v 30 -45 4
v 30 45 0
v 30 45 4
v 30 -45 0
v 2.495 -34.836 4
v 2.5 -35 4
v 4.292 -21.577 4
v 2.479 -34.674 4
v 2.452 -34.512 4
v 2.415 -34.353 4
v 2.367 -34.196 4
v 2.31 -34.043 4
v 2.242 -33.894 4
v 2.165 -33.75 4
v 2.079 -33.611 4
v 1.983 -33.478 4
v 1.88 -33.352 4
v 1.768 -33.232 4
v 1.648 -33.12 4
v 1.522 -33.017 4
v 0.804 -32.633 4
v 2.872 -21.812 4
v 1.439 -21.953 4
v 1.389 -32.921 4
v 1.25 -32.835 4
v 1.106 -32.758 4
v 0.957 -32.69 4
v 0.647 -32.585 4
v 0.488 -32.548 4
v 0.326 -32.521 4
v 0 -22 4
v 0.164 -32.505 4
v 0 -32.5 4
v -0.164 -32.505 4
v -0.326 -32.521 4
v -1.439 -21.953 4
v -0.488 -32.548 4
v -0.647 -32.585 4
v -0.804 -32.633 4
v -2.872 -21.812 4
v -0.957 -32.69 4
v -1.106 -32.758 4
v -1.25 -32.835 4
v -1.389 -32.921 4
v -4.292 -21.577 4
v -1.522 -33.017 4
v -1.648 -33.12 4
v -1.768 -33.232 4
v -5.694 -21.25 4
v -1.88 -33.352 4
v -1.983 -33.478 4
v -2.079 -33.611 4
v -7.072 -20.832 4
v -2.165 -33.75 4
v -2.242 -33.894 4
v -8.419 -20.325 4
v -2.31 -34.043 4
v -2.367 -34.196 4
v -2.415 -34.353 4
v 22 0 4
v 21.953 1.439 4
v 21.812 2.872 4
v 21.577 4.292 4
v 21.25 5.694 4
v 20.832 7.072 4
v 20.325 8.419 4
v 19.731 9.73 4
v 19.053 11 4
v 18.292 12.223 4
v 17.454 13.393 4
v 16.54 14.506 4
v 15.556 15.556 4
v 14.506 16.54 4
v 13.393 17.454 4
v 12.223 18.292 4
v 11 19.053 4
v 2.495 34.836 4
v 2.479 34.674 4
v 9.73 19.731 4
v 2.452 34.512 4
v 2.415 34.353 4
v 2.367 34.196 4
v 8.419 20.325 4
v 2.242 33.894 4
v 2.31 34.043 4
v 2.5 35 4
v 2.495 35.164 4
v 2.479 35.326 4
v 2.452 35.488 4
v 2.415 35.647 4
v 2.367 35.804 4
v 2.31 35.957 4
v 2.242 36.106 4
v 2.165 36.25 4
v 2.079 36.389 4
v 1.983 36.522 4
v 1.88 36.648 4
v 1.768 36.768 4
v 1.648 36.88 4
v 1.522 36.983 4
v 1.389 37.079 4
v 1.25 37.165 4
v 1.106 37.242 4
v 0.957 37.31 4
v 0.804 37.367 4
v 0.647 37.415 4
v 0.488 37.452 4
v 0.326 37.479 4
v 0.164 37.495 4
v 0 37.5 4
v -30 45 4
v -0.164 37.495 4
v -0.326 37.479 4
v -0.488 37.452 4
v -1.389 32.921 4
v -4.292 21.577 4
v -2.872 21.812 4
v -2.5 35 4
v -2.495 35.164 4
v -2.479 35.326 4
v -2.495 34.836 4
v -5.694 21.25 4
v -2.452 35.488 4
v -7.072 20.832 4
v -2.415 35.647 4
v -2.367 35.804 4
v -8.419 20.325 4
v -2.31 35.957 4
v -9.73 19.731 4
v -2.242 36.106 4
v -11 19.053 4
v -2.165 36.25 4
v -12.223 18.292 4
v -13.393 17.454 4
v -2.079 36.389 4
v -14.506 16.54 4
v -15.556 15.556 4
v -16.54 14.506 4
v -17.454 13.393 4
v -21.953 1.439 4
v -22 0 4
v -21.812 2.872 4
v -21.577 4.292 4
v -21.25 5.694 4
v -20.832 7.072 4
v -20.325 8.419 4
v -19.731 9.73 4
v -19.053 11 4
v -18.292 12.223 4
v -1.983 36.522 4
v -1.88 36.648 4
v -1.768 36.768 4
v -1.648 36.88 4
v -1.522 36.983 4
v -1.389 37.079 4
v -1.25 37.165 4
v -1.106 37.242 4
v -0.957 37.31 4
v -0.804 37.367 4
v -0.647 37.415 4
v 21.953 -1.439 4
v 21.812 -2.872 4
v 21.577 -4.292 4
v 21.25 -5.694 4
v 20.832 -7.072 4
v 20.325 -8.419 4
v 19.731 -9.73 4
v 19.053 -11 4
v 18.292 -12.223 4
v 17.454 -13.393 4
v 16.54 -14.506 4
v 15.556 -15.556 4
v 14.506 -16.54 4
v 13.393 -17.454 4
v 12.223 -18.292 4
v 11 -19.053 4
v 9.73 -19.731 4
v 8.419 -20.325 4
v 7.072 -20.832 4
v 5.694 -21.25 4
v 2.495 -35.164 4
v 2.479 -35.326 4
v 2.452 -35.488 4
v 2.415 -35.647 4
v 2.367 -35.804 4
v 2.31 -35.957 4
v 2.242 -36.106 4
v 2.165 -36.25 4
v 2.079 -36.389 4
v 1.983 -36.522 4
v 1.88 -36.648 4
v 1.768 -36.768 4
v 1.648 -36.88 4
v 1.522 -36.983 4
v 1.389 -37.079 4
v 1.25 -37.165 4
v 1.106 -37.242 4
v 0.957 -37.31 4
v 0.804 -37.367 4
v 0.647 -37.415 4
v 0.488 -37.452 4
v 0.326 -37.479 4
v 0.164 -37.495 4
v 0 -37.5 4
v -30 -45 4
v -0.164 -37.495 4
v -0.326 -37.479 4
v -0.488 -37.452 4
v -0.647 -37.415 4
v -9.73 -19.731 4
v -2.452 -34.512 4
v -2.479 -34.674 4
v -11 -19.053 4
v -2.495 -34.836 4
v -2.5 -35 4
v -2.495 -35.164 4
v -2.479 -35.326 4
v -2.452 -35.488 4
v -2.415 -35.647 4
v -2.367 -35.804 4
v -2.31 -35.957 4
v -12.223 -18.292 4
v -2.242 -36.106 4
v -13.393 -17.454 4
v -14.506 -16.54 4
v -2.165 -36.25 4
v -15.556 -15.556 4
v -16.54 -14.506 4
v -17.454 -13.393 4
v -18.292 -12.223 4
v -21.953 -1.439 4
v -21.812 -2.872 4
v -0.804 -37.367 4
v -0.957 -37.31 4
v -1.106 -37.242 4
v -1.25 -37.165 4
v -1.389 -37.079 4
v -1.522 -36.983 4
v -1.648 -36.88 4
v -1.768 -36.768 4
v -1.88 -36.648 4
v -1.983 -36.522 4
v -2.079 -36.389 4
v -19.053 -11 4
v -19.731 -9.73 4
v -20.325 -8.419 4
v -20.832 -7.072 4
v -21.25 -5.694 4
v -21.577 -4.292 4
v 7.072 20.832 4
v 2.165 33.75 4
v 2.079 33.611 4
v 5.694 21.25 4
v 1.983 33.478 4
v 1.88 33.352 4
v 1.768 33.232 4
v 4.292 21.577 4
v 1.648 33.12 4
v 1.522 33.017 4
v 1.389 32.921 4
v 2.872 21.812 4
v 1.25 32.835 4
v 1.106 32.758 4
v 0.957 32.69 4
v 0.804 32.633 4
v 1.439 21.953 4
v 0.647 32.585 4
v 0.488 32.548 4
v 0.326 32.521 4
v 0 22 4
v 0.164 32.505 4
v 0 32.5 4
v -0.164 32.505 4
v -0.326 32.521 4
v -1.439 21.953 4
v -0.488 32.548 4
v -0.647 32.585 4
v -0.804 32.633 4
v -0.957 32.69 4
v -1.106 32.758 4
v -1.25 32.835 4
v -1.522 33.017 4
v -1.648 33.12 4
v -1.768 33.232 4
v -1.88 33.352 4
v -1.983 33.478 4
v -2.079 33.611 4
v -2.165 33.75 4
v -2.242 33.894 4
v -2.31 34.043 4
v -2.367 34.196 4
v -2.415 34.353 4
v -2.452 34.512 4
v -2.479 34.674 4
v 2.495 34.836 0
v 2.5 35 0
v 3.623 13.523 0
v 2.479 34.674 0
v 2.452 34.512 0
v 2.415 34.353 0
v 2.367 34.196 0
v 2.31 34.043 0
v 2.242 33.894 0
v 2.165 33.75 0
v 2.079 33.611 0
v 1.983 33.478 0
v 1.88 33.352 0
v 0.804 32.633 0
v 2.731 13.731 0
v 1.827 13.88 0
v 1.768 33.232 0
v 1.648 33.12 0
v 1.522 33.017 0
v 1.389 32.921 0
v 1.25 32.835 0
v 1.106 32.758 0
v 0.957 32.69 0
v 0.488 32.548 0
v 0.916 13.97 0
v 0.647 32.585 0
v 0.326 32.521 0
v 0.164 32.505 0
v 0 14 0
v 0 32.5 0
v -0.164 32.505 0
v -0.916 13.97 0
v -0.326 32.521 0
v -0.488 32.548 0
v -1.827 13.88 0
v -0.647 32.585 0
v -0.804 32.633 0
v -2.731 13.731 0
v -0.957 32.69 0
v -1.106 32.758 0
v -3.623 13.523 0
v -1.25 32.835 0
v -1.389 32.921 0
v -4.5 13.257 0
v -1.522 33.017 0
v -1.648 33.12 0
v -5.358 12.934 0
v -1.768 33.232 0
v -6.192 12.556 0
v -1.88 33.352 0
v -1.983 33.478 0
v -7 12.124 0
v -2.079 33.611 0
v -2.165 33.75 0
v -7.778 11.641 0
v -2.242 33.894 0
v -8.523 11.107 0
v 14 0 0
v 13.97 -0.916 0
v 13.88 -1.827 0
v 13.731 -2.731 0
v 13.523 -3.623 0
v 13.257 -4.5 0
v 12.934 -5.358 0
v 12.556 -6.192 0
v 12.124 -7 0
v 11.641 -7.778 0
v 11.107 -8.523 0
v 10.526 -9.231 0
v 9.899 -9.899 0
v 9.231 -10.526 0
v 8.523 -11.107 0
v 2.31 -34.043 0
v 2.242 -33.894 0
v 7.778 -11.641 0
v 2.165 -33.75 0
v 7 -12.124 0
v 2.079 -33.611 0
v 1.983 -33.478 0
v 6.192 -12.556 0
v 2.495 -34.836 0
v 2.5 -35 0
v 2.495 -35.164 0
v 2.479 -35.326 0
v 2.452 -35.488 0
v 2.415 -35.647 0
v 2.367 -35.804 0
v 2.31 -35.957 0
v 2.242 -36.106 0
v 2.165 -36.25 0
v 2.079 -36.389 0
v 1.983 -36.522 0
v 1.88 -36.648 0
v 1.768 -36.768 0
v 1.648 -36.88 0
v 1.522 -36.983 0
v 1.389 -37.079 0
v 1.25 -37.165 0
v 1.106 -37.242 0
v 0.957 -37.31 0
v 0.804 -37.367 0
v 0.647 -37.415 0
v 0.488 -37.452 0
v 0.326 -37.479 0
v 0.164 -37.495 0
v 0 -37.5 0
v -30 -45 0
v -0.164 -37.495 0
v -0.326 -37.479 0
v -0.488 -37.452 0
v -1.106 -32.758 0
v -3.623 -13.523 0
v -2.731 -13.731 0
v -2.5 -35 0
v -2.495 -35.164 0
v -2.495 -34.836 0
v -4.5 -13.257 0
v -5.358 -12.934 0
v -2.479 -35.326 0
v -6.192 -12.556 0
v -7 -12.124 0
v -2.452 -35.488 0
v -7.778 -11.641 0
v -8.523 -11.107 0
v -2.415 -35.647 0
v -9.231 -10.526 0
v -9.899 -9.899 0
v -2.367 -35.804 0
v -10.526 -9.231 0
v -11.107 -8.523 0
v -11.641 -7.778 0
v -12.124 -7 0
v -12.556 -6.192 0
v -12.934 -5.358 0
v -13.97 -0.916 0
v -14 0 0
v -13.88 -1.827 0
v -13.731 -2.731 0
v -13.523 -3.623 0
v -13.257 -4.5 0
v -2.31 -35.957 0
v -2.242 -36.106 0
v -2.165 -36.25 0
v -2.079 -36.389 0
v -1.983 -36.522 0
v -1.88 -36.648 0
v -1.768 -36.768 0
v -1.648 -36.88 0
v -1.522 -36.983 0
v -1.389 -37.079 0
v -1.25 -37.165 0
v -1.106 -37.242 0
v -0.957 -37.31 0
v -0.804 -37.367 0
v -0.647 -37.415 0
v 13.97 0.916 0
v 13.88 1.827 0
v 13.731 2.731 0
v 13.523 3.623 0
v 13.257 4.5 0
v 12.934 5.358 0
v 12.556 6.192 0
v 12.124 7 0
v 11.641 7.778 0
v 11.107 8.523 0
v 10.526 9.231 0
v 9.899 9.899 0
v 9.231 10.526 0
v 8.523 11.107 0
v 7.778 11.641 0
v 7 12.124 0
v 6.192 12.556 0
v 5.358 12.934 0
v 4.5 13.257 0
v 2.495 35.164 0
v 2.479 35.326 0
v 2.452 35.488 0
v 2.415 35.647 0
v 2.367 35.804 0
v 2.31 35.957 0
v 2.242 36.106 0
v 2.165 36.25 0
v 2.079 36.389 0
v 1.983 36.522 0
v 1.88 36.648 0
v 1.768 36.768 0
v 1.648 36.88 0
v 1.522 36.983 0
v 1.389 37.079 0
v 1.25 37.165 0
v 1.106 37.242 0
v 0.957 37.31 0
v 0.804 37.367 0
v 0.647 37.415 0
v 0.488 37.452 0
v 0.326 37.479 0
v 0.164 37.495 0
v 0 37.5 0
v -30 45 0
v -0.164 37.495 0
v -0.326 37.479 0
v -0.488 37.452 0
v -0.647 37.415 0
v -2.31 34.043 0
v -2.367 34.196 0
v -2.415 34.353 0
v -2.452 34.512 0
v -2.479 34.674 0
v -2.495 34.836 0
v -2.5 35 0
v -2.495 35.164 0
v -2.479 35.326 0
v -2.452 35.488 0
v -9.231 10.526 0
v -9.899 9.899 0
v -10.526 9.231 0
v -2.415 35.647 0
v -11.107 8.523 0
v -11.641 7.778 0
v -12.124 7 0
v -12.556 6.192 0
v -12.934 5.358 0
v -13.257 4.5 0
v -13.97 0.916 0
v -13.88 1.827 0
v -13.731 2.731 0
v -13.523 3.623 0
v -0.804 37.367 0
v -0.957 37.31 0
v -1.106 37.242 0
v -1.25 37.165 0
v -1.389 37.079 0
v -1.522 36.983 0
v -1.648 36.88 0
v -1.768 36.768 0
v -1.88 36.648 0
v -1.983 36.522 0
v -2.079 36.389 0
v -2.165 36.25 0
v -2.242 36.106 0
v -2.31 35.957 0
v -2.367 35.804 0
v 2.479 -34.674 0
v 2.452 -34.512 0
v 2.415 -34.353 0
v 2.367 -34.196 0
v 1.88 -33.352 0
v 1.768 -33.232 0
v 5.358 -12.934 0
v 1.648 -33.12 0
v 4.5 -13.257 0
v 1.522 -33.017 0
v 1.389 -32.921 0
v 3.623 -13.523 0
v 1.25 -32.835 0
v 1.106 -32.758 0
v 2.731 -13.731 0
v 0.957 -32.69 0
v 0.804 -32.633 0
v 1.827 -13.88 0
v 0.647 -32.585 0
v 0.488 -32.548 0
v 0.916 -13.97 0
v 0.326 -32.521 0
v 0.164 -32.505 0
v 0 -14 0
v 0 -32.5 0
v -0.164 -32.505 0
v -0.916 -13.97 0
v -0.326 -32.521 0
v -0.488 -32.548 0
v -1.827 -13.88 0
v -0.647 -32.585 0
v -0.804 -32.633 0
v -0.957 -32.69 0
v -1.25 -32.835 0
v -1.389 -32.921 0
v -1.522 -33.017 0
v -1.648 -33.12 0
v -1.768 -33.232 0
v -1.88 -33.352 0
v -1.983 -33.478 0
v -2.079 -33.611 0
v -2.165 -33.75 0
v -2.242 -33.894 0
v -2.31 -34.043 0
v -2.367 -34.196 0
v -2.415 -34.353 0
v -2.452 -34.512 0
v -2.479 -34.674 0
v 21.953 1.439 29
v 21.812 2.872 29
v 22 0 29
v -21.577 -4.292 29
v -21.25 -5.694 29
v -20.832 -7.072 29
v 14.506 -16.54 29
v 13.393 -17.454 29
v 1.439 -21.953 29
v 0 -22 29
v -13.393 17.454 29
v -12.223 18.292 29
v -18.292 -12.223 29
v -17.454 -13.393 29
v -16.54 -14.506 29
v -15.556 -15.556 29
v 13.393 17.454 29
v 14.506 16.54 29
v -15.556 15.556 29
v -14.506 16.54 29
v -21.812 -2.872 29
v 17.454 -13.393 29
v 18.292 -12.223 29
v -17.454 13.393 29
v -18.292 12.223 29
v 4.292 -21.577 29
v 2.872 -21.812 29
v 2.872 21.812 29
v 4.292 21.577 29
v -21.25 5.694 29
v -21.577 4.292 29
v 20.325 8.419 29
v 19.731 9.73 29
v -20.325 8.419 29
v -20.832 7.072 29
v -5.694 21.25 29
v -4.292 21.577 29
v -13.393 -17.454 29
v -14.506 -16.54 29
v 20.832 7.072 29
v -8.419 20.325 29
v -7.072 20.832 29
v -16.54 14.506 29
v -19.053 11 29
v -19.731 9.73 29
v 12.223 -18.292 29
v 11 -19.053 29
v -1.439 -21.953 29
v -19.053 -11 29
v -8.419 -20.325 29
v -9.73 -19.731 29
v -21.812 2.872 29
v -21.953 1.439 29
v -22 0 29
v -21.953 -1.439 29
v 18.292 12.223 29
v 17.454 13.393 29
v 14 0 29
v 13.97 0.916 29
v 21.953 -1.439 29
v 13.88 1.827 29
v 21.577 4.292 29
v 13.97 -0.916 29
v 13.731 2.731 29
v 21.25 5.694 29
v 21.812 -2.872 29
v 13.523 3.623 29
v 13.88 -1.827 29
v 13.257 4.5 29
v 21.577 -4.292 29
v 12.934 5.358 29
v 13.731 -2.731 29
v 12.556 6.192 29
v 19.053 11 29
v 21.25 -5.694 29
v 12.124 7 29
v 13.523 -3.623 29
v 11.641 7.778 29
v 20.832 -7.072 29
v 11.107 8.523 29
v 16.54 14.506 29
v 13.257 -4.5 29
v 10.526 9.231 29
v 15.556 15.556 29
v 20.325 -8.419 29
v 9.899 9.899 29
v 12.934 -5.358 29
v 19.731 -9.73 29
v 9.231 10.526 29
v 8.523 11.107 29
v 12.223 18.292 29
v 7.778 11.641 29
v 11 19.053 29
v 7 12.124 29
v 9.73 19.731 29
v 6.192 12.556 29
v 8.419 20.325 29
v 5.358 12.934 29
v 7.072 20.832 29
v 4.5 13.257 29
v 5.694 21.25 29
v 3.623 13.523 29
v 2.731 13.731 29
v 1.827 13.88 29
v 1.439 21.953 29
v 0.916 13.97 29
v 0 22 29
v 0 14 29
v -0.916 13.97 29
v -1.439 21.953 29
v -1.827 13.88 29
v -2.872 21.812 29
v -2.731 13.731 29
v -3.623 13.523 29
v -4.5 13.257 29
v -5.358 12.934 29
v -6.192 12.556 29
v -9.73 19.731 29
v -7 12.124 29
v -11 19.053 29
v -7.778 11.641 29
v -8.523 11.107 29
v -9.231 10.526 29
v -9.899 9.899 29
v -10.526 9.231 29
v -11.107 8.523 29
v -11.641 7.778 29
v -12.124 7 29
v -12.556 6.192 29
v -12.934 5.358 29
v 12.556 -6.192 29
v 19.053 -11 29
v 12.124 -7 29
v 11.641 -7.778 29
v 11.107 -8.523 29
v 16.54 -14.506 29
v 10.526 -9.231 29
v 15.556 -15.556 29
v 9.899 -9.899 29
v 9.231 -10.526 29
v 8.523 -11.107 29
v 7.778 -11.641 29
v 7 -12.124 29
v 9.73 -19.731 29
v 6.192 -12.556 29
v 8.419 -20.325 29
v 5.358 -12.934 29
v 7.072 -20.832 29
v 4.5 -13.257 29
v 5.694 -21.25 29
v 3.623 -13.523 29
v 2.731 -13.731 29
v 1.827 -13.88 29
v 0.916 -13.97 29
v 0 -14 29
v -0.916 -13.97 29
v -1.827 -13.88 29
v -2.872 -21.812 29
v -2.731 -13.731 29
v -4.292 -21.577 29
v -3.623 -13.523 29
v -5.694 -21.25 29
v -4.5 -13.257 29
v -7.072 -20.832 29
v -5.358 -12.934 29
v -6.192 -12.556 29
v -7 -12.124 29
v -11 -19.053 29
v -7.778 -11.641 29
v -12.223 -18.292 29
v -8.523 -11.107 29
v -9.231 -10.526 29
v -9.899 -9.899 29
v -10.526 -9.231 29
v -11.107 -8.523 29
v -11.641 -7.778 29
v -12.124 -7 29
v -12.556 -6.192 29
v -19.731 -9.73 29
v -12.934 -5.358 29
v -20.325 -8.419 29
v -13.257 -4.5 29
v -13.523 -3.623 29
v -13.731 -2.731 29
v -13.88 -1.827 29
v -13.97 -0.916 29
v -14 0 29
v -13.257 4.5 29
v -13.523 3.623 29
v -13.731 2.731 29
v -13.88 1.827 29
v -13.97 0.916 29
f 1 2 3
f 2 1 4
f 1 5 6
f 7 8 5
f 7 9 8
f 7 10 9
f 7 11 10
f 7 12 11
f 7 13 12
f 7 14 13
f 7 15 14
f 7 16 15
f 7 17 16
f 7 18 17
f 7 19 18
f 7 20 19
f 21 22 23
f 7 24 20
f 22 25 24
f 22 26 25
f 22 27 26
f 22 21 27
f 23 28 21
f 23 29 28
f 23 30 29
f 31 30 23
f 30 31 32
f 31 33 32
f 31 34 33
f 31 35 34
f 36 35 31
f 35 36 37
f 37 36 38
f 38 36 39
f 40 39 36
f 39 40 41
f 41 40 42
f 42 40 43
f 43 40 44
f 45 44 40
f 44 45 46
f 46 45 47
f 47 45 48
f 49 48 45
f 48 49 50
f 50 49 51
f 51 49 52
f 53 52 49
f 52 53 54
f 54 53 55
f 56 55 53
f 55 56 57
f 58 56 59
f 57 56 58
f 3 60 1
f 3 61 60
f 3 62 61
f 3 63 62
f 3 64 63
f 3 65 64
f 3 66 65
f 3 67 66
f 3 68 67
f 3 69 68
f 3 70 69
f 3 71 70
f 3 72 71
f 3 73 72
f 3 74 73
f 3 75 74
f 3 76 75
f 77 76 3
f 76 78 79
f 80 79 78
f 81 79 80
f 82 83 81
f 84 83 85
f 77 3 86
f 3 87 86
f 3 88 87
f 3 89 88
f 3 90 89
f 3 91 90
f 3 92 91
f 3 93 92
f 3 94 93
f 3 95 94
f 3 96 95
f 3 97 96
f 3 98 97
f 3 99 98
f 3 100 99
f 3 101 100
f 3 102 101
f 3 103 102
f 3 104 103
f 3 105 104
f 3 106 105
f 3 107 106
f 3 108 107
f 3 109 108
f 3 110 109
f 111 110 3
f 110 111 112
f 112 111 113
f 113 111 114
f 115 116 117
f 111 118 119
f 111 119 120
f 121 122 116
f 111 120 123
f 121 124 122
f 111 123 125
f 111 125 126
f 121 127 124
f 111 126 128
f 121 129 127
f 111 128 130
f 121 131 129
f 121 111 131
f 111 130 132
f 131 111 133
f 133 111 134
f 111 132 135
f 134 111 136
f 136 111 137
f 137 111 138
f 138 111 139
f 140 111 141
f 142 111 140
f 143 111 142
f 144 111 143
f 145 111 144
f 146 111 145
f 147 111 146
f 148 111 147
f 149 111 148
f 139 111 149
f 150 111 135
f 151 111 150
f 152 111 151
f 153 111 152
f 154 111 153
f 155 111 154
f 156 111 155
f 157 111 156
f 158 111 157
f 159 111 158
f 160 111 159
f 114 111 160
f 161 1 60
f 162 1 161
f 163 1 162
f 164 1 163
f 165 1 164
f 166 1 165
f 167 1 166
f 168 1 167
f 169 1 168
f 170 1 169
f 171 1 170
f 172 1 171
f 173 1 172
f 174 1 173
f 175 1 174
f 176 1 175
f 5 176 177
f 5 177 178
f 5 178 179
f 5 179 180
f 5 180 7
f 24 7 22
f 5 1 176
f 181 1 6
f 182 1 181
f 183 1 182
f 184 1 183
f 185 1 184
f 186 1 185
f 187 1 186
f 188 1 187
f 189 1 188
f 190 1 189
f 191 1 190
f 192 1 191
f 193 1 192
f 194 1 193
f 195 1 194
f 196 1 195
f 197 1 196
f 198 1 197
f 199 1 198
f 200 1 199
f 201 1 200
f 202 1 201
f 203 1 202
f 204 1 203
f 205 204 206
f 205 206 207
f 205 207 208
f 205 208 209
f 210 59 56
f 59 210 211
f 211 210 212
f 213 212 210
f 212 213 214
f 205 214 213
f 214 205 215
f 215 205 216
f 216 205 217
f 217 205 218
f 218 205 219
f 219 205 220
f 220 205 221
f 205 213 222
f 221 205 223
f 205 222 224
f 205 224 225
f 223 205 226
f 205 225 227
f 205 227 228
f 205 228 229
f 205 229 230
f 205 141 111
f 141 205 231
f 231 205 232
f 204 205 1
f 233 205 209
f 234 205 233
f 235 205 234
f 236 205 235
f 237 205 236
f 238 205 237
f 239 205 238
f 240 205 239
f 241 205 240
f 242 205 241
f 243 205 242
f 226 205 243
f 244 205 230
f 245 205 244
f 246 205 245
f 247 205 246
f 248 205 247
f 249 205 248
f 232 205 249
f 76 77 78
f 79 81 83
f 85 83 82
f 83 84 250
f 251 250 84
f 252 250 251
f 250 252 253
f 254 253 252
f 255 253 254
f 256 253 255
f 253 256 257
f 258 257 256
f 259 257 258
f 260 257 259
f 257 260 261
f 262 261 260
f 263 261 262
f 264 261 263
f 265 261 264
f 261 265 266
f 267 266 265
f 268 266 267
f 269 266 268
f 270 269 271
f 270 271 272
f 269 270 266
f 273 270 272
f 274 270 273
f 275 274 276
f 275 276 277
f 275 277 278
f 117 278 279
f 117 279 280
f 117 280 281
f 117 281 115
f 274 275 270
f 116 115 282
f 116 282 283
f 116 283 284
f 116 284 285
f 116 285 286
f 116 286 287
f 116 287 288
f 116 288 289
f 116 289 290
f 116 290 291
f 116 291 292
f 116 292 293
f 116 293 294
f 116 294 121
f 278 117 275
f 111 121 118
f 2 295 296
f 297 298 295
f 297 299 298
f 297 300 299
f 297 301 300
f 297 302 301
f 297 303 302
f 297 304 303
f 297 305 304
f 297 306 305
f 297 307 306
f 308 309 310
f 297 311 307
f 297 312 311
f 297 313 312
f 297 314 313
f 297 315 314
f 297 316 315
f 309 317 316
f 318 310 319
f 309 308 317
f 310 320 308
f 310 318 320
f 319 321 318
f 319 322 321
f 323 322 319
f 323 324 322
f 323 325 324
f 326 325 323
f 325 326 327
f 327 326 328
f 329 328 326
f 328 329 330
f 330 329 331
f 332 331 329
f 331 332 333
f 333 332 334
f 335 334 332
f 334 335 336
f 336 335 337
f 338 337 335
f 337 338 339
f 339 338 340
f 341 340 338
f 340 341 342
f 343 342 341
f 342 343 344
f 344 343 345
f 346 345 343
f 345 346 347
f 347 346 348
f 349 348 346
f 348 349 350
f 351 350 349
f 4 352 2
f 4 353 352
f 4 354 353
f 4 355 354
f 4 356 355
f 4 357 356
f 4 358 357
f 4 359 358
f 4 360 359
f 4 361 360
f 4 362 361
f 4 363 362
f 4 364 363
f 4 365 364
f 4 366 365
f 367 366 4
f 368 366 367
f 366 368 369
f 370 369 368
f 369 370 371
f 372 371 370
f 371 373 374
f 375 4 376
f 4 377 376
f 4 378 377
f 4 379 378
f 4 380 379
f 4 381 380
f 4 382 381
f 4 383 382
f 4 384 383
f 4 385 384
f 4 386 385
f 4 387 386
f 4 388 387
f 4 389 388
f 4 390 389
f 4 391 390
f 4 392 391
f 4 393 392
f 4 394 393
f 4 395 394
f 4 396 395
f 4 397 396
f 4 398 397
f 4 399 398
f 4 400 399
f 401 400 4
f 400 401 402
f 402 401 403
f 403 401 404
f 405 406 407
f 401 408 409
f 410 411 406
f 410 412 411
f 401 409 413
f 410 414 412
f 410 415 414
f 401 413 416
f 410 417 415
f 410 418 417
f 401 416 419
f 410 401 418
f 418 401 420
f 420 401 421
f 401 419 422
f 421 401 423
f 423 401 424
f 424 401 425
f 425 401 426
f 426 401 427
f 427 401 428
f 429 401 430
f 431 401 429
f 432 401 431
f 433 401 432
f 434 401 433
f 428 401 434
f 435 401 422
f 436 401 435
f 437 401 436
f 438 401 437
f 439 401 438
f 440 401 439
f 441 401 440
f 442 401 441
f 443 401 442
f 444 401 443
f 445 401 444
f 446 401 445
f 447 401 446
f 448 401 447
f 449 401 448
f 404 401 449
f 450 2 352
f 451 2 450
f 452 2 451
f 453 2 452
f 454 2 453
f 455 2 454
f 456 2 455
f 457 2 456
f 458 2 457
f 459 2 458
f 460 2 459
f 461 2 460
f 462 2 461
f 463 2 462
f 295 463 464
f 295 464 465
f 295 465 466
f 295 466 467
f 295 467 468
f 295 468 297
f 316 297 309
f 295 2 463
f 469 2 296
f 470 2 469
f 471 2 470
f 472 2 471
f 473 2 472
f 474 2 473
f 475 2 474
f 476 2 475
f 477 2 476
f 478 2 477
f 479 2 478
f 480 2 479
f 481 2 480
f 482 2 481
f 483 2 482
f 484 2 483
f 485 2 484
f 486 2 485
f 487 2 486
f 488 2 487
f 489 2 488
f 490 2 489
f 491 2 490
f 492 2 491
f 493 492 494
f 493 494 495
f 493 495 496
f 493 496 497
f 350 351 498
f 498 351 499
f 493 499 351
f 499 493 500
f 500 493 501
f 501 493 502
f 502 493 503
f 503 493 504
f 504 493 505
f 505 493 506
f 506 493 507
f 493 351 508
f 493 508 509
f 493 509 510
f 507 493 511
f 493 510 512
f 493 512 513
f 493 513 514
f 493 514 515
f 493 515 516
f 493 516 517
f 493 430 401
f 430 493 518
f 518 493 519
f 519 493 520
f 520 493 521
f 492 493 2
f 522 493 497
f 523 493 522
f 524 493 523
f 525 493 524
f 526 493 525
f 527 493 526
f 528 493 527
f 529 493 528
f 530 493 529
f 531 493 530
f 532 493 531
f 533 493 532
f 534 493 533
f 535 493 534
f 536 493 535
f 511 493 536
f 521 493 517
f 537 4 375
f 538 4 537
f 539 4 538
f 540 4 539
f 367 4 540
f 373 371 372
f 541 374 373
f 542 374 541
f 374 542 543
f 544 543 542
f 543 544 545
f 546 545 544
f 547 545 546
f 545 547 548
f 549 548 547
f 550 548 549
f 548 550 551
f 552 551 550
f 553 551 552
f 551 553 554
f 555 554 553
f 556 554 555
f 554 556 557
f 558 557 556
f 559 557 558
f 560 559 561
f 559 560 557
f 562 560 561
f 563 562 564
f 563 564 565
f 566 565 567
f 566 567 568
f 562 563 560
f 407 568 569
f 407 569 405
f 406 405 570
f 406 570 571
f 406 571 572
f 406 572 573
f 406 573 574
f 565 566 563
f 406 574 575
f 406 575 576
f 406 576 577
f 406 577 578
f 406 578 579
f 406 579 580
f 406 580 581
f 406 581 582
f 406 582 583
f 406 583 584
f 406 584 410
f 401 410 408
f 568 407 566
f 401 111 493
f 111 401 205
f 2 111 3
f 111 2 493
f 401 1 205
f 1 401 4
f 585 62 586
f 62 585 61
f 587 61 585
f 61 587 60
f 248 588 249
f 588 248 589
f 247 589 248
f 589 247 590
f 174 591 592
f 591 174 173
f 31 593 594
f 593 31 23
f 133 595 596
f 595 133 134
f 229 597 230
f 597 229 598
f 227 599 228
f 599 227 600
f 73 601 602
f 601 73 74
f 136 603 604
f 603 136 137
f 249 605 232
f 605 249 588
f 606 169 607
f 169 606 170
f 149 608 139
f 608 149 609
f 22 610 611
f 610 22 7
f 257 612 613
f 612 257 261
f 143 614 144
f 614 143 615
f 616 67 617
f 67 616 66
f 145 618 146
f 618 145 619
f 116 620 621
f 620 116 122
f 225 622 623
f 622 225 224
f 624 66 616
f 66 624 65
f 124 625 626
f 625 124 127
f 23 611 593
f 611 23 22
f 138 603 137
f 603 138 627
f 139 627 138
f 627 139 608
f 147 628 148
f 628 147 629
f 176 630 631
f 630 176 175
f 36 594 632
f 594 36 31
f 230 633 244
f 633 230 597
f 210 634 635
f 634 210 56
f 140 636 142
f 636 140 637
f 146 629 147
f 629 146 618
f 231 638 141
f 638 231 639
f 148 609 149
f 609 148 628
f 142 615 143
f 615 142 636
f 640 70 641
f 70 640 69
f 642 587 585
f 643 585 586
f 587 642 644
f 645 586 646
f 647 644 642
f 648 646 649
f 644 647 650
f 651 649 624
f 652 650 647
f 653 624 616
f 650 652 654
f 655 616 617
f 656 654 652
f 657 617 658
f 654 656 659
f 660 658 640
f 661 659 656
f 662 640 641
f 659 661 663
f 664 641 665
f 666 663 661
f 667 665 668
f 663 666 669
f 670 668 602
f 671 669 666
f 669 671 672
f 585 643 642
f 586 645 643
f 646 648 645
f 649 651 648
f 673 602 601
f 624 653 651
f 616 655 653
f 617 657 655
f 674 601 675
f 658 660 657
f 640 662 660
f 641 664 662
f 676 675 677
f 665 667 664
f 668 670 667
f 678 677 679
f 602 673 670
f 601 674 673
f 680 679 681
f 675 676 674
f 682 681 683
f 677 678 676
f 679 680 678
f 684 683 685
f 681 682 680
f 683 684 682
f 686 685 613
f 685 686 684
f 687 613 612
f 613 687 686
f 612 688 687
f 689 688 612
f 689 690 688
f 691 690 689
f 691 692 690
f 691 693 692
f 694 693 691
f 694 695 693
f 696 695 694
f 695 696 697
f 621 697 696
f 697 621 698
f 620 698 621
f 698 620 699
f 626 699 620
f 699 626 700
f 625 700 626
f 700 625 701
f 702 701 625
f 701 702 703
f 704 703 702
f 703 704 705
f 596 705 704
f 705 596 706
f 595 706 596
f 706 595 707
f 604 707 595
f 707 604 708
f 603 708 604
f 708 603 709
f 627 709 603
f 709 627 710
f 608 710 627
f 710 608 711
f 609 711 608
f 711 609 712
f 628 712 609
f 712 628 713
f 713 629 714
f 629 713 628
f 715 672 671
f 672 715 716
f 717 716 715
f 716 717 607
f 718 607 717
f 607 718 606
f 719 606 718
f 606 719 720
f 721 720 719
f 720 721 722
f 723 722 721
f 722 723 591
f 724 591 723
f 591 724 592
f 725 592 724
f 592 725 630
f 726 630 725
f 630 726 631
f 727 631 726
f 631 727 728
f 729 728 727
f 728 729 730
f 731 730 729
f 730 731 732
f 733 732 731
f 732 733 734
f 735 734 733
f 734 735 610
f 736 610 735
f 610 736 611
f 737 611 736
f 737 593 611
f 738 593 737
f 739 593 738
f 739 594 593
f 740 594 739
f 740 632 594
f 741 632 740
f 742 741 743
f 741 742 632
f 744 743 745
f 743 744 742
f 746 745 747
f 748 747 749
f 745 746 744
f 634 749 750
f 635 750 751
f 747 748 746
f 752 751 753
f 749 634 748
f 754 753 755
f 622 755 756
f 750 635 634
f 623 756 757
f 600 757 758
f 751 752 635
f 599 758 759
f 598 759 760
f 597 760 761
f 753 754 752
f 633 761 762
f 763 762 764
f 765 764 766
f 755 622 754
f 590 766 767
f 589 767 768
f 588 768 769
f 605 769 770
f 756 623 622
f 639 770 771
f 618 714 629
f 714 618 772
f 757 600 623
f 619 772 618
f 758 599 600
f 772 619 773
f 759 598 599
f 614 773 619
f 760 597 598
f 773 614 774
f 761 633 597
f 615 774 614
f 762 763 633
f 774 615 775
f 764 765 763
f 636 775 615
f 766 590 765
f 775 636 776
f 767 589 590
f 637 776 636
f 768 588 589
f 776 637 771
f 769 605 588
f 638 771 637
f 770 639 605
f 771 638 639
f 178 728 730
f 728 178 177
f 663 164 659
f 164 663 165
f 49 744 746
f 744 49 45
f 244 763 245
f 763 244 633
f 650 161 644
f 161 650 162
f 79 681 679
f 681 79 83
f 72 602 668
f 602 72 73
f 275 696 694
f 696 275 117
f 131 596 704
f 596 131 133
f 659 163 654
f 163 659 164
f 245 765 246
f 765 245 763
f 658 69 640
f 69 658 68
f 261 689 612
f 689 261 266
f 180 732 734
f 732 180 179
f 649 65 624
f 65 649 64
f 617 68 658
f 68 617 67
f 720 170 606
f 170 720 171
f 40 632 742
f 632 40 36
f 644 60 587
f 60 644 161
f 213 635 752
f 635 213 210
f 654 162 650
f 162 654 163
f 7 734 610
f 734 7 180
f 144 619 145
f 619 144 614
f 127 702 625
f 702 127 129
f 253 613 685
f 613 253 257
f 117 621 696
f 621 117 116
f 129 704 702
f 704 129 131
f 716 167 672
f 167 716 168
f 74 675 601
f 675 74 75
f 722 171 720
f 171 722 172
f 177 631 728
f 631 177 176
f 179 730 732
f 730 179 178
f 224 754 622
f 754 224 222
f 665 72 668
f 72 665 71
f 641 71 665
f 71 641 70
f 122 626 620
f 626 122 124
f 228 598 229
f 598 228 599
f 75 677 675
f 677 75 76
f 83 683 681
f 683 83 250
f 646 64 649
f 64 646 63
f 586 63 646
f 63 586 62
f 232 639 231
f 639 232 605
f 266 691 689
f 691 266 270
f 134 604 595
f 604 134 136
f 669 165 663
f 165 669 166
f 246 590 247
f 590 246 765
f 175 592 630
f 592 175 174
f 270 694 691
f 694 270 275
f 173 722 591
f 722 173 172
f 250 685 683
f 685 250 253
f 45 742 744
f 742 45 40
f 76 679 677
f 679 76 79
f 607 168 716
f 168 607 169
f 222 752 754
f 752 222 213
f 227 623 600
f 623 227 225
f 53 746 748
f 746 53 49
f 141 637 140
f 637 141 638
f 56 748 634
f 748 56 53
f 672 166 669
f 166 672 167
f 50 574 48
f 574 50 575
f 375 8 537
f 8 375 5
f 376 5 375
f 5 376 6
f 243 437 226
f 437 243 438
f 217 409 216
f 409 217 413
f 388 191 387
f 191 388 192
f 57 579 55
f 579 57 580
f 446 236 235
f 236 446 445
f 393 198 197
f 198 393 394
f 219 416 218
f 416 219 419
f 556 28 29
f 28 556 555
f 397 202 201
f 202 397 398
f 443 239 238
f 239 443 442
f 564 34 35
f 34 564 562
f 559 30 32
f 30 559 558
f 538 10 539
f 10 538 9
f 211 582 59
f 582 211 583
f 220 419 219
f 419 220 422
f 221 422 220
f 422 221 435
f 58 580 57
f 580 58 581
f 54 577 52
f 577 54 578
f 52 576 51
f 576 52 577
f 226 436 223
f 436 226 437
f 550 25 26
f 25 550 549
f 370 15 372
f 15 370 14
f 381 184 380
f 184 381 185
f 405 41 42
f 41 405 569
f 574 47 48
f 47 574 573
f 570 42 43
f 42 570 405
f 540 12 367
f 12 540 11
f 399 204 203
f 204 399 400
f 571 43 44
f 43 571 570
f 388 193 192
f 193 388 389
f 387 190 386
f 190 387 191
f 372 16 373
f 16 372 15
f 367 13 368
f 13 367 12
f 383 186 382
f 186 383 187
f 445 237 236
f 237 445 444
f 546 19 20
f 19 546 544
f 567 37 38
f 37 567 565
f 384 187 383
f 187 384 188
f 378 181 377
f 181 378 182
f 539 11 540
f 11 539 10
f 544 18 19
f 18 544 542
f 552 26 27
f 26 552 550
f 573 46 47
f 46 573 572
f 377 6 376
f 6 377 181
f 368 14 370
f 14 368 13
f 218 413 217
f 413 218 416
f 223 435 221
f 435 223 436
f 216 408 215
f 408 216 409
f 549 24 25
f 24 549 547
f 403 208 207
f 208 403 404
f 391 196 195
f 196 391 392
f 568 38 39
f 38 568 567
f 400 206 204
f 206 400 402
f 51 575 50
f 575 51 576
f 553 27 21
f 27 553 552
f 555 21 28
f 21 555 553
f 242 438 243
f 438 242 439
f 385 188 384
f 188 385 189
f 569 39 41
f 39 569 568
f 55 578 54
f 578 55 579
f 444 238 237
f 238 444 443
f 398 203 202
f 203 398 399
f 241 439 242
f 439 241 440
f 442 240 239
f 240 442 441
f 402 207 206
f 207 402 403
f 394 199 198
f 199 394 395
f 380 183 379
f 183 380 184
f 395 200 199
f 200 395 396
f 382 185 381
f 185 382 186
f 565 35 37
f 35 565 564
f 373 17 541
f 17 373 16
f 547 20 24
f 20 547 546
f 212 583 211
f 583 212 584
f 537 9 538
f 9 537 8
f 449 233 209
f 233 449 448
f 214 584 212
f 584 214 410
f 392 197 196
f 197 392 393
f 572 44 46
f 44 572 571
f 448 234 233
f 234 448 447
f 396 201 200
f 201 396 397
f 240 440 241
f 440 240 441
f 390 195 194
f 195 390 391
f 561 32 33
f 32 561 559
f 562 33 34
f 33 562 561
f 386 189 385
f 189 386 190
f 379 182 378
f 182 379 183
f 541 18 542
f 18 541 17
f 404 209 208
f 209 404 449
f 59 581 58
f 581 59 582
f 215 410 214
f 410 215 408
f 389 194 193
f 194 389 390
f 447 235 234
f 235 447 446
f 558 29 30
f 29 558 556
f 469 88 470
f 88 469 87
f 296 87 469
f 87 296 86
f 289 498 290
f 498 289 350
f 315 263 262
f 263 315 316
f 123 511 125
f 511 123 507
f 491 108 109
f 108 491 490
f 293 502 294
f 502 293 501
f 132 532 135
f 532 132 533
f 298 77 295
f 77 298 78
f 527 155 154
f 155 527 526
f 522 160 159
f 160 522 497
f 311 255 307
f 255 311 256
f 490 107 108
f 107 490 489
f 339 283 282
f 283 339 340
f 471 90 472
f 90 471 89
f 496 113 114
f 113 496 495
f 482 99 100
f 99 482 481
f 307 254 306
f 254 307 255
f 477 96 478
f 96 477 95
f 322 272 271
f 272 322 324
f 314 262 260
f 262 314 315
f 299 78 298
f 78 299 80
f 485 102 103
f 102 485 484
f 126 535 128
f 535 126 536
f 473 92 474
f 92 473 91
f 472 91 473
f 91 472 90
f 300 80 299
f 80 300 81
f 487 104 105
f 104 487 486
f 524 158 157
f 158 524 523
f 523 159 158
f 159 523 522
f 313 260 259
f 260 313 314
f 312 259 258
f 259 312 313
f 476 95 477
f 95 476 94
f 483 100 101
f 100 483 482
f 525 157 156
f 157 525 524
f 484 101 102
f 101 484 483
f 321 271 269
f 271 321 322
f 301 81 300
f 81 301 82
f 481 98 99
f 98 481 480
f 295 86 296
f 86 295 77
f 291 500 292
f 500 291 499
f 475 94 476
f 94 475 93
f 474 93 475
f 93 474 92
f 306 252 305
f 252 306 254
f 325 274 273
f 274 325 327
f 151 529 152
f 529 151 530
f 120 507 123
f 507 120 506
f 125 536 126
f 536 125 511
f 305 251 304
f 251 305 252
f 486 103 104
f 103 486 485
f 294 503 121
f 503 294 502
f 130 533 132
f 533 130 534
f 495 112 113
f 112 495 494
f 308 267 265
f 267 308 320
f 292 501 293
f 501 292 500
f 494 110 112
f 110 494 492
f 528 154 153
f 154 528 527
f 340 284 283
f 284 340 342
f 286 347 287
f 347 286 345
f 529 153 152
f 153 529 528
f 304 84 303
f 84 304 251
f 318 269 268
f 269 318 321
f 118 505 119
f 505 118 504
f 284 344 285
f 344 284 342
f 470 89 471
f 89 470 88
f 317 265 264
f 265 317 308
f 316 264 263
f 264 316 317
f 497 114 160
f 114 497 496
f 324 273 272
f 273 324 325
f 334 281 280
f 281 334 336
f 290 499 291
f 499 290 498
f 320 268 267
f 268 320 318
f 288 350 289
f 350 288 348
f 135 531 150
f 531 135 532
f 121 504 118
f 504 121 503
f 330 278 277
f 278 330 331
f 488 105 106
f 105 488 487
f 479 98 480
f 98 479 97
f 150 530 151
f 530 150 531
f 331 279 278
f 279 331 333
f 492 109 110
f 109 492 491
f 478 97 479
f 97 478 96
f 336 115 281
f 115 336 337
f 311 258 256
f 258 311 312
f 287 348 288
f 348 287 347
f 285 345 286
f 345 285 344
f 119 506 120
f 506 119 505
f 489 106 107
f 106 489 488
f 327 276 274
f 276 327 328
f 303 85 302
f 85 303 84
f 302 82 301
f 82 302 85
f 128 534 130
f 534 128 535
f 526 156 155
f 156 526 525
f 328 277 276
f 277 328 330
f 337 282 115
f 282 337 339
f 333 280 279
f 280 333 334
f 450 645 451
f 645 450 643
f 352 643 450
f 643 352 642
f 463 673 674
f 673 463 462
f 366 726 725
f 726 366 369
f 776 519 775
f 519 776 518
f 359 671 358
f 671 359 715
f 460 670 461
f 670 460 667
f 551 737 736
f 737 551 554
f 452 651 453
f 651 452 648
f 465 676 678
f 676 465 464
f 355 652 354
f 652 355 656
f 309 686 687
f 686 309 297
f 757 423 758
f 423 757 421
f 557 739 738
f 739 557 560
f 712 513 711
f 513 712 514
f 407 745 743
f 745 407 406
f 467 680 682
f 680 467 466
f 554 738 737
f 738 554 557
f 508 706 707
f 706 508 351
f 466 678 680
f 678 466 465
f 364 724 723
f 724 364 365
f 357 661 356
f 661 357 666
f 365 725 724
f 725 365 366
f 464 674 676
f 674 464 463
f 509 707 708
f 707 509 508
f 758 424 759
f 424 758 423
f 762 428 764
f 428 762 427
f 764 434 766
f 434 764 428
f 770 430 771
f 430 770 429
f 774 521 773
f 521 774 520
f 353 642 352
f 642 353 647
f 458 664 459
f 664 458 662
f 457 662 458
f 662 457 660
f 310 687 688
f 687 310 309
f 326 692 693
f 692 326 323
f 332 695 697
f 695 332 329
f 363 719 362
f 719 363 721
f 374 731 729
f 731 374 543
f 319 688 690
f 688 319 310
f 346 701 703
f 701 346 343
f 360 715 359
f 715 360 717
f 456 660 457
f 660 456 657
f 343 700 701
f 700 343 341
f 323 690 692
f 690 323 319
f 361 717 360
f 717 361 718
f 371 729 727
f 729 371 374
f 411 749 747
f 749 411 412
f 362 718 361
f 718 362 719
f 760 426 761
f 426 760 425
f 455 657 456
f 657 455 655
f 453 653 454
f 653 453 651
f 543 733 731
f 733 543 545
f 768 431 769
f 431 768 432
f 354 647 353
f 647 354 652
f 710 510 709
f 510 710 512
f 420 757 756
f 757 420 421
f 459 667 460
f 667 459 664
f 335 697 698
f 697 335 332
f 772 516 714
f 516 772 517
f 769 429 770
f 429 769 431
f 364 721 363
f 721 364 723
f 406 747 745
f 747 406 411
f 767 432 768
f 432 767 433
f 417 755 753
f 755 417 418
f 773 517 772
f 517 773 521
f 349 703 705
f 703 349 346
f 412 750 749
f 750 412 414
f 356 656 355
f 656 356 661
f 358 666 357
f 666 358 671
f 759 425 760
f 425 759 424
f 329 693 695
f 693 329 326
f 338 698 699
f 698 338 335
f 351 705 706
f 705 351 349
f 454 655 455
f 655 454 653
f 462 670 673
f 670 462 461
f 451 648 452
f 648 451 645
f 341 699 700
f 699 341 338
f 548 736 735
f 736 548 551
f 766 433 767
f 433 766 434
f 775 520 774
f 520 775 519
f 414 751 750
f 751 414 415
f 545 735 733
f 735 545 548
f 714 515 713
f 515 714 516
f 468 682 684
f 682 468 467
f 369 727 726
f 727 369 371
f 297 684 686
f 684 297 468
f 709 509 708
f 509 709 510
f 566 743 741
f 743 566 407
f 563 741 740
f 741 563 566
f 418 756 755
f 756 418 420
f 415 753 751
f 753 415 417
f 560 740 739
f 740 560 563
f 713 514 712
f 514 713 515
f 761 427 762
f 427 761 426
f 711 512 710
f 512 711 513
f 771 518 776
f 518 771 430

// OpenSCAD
// t2-009 wall-mounted tool holder
$fn = 96;
bore_diameter = 28;
collar_height = 25;
plate_width = 60;
plate_height = 90;
plate_thickness = 4;
collar_od = 44;
screw_diameter = 5;
screw_y = 35;

difference() {
    union() {
        translate([-plate_width / 2, -plate_height / 2, 0])
            cube([plate_width, plate_height, plate_thickness]);
        translate([0, 0, plate_thickness - 0.01])
            cylinder(d = collar_od, h = collar_height + 0.01);
    }
    translate([0, 0, -1]) cylinder(d = bore_diameter, h = plate_thickness + collar_height + 2);
    for (s = [-1, 1])
        translate([0, s * screw_y, -1]) cylinder(d = screw_diameter, h = plate_thickness + 2);
}
